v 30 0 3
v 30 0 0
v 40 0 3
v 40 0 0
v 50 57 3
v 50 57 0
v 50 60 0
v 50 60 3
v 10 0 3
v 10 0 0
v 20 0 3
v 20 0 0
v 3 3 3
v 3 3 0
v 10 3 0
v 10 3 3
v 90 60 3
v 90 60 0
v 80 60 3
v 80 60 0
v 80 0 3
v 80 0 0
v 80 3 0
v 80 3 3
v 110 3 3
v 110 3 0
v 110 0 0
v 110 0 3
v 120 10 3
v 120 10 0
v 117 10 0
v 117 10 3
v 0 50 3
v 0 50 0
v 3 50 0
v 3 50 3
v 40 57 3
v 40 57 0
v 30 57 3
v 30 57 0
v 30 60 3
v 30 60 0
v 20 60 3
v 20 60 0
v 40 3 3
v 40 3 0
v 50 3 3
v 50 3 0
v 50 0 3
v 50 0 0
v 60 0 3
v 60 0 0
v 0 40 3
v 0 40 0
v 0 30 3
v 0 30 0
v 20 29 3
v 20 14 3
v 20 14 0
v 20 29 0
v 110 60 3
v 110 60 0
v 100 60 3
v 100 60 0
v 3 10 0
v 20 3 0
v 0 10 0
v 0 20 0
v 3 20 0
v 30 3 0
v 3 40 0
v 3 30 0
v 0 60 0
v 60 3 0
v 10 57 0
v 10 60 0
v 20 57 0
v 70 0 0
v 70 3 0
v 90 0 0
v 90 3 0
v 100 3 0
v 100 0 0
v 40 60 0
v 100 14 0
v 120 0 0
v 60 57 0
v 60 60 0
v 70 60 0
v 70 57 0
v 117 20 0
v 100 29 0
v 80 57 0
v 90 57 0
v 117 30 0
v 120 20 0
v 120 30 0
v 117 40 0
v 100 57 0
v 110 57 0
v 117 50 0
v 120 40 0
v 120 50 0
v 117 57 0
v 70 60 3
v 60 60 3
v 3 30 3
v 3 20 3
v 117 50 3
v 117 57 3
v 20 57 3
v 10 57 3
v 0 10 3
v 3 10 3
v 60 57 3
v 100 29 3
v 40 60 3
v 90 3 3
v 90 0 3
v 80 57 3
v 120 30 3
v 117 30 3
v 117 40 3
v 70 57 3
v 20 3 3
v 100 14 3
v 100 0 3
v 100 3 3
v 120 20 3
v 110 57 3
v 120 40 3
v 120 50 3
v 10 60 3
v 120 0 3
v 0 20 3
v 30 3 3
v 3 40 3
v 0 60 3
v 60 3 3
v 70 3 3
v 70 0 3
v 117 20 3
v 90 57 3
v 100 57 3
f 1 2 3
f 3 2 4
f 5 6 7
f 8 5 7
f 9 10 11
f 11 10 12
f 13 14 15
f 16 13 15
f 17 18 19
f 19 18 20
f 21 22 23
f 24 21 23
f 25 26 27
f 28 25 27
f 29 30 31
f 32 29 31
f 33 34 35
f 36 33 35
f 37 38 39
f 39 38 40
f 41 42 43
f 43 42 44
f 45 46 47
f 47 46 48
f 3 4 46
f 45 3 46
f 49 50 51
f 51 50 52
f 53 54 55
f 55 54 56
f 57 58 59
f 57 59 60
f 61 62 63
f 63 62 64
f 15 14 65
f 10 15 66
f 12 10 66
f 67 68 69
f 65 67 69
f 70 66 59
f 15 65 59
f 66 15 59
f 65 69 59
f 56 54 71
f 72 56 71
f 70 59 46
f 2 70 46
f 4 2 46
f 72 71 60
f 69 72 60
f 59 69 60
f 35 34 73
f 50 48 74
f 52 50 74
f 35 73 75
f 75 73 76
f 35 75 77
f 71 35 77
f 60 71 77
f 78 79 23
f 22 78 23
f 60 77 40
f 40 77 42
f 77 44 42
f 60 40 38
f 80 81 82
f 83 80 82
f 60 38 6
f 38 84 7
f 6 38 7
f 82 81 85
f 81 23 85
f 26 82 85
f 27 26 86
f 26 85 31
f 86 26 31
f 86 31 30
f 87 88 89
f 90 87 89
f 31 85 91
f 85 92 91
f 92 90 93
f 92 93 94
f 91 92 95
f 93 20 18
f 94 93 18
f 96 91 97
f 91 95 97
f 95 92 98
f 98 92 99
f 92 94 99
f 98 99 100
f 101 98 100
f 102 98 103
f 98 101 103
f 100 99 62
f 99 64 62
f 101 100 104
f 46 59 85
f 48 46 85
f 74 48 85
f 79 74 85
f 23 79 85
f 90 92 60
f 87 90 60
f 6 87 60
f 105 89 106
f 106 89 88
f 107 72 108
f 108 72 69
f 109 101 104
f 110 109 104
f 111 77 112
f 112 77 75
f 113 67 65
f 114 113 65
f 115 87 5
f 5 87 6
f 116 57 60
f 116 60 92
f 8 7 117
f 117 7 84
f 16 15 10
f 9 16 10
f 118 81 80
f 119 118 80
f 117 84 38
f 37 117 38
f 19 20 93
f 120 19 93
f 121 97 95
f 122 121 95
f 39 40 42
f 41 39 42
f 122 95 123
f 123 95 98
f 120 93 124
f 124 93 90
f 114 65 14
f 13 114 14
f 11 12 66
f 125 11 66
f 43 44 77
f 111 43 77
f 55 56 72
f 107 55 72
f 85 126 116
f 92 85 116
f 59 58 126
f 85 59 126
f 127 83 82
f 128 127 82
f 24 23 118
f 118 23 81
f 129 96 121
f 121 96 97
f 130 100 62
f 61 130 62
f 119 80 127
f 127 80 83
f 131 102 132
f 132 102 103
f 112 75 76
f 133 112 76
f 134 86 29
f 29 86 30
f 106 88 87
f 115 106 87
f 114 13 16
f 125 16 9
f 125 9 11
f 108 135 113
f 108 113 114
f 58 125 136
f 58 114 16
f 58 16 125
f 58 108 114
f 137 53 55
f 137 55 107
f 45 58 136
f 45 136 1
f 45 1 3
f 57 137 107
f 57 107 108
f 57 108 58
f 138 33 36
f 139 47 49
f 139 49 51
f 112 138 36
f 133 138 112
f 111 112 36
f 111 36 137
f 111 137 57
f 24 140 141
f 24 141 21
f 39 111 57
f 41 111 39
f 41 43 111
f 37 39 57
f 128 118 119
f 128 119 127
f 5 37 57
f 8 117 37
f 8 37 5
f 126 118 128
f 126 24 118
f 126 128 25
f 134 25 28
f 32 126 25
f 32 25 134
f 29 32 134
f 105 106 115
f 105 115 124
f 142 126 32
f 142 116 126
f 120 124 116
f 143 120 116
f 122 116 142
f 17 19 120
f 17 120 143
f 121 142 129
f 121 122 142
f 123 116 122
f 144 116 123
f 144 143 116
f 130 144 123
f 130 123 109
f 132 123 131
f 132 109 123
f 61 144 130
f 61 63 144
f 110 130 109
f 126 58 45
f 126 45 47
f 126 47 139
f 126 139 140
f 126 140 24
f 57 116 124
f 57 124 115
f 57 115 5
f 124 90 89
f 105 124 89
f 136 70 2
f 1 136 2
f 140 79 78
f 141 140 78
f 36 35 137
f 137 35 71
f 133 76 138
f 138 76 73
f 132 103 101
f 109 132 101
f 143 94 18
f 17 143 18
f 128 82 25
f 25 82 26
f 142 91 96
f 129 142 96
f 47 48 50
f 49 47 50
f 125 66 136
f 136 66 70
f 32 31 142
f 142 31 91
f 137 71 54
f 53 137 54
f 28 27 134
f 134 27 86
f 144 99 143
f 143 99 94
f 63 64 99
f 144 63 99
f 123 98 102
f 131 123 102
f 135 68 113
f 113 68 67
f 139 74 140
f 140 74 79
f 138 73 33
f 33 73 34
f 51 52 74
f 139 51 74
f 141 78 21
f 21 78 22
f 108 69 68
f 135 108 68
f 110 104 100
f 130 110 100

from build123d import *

# Parameters (mm, degrees)
BOSS_EXTRUDE1_DEPTH = 3
SKETCH2_W           = 80
SKETCH2_H           = 15
CUT_EXTRUDE1_DEPTH  = 10


with BuildPart() as part:
    # Sketch1 → Boss-Extrude1 (new body)
    with BuildSketch(Plane.XY):
        Polygon((120, 0), (120, 10), (117, 10), (117, 20), (120, 20), (120, 30), (117, 30), (117, 40), (120, 40), (120, 50), (117, 50), (117, 57), (110, 57), (110, 60), (100, 60), (100, 57), (90, 57), (90, 60), (80, 60), (80, 57), (70, 57), (70, 60), (60, 60), (60, 57), (50, 57), (50, 60), (40, 60), (40, 57), (30, 57), (30, 60), (20, 60), (20, 57), (10, 57), (10, 60), (0, 60), (0, 50), (3, 50), (3, 40), (0, 40), (0, 30), (3, 30), (3, 20), (0, 20), (0, 10), (3, 10), (3, 3), (10, 3), (10, 0), (20, 0), (20, 3), (30, 3), (30, 0), (40, 0), (40, 3), (50, 3), (50, 0), (60, 0), (60, 3), (70, 3), (70, 0), (80, 0), (80, 3), (90, 3), (90, 0), (100, 0), (100, 3), (110, 3), (110, 0), align=None)
    extrude(amount=BOSS_EXTRUDE1_DEPTH)

    # Sketch2 → Cut-Extrude1 (cut)
    with BuildSketch(Plane.XY.offset(3)):
        with Locations((60, 21.5)):
            Rectangle(SKETCH2_W, SKETCH2_H)
    extrude(amount=-CUT_EXTRUDE1_DEPTH, mode=Mode.SUBTRACT)


solid = part.part
